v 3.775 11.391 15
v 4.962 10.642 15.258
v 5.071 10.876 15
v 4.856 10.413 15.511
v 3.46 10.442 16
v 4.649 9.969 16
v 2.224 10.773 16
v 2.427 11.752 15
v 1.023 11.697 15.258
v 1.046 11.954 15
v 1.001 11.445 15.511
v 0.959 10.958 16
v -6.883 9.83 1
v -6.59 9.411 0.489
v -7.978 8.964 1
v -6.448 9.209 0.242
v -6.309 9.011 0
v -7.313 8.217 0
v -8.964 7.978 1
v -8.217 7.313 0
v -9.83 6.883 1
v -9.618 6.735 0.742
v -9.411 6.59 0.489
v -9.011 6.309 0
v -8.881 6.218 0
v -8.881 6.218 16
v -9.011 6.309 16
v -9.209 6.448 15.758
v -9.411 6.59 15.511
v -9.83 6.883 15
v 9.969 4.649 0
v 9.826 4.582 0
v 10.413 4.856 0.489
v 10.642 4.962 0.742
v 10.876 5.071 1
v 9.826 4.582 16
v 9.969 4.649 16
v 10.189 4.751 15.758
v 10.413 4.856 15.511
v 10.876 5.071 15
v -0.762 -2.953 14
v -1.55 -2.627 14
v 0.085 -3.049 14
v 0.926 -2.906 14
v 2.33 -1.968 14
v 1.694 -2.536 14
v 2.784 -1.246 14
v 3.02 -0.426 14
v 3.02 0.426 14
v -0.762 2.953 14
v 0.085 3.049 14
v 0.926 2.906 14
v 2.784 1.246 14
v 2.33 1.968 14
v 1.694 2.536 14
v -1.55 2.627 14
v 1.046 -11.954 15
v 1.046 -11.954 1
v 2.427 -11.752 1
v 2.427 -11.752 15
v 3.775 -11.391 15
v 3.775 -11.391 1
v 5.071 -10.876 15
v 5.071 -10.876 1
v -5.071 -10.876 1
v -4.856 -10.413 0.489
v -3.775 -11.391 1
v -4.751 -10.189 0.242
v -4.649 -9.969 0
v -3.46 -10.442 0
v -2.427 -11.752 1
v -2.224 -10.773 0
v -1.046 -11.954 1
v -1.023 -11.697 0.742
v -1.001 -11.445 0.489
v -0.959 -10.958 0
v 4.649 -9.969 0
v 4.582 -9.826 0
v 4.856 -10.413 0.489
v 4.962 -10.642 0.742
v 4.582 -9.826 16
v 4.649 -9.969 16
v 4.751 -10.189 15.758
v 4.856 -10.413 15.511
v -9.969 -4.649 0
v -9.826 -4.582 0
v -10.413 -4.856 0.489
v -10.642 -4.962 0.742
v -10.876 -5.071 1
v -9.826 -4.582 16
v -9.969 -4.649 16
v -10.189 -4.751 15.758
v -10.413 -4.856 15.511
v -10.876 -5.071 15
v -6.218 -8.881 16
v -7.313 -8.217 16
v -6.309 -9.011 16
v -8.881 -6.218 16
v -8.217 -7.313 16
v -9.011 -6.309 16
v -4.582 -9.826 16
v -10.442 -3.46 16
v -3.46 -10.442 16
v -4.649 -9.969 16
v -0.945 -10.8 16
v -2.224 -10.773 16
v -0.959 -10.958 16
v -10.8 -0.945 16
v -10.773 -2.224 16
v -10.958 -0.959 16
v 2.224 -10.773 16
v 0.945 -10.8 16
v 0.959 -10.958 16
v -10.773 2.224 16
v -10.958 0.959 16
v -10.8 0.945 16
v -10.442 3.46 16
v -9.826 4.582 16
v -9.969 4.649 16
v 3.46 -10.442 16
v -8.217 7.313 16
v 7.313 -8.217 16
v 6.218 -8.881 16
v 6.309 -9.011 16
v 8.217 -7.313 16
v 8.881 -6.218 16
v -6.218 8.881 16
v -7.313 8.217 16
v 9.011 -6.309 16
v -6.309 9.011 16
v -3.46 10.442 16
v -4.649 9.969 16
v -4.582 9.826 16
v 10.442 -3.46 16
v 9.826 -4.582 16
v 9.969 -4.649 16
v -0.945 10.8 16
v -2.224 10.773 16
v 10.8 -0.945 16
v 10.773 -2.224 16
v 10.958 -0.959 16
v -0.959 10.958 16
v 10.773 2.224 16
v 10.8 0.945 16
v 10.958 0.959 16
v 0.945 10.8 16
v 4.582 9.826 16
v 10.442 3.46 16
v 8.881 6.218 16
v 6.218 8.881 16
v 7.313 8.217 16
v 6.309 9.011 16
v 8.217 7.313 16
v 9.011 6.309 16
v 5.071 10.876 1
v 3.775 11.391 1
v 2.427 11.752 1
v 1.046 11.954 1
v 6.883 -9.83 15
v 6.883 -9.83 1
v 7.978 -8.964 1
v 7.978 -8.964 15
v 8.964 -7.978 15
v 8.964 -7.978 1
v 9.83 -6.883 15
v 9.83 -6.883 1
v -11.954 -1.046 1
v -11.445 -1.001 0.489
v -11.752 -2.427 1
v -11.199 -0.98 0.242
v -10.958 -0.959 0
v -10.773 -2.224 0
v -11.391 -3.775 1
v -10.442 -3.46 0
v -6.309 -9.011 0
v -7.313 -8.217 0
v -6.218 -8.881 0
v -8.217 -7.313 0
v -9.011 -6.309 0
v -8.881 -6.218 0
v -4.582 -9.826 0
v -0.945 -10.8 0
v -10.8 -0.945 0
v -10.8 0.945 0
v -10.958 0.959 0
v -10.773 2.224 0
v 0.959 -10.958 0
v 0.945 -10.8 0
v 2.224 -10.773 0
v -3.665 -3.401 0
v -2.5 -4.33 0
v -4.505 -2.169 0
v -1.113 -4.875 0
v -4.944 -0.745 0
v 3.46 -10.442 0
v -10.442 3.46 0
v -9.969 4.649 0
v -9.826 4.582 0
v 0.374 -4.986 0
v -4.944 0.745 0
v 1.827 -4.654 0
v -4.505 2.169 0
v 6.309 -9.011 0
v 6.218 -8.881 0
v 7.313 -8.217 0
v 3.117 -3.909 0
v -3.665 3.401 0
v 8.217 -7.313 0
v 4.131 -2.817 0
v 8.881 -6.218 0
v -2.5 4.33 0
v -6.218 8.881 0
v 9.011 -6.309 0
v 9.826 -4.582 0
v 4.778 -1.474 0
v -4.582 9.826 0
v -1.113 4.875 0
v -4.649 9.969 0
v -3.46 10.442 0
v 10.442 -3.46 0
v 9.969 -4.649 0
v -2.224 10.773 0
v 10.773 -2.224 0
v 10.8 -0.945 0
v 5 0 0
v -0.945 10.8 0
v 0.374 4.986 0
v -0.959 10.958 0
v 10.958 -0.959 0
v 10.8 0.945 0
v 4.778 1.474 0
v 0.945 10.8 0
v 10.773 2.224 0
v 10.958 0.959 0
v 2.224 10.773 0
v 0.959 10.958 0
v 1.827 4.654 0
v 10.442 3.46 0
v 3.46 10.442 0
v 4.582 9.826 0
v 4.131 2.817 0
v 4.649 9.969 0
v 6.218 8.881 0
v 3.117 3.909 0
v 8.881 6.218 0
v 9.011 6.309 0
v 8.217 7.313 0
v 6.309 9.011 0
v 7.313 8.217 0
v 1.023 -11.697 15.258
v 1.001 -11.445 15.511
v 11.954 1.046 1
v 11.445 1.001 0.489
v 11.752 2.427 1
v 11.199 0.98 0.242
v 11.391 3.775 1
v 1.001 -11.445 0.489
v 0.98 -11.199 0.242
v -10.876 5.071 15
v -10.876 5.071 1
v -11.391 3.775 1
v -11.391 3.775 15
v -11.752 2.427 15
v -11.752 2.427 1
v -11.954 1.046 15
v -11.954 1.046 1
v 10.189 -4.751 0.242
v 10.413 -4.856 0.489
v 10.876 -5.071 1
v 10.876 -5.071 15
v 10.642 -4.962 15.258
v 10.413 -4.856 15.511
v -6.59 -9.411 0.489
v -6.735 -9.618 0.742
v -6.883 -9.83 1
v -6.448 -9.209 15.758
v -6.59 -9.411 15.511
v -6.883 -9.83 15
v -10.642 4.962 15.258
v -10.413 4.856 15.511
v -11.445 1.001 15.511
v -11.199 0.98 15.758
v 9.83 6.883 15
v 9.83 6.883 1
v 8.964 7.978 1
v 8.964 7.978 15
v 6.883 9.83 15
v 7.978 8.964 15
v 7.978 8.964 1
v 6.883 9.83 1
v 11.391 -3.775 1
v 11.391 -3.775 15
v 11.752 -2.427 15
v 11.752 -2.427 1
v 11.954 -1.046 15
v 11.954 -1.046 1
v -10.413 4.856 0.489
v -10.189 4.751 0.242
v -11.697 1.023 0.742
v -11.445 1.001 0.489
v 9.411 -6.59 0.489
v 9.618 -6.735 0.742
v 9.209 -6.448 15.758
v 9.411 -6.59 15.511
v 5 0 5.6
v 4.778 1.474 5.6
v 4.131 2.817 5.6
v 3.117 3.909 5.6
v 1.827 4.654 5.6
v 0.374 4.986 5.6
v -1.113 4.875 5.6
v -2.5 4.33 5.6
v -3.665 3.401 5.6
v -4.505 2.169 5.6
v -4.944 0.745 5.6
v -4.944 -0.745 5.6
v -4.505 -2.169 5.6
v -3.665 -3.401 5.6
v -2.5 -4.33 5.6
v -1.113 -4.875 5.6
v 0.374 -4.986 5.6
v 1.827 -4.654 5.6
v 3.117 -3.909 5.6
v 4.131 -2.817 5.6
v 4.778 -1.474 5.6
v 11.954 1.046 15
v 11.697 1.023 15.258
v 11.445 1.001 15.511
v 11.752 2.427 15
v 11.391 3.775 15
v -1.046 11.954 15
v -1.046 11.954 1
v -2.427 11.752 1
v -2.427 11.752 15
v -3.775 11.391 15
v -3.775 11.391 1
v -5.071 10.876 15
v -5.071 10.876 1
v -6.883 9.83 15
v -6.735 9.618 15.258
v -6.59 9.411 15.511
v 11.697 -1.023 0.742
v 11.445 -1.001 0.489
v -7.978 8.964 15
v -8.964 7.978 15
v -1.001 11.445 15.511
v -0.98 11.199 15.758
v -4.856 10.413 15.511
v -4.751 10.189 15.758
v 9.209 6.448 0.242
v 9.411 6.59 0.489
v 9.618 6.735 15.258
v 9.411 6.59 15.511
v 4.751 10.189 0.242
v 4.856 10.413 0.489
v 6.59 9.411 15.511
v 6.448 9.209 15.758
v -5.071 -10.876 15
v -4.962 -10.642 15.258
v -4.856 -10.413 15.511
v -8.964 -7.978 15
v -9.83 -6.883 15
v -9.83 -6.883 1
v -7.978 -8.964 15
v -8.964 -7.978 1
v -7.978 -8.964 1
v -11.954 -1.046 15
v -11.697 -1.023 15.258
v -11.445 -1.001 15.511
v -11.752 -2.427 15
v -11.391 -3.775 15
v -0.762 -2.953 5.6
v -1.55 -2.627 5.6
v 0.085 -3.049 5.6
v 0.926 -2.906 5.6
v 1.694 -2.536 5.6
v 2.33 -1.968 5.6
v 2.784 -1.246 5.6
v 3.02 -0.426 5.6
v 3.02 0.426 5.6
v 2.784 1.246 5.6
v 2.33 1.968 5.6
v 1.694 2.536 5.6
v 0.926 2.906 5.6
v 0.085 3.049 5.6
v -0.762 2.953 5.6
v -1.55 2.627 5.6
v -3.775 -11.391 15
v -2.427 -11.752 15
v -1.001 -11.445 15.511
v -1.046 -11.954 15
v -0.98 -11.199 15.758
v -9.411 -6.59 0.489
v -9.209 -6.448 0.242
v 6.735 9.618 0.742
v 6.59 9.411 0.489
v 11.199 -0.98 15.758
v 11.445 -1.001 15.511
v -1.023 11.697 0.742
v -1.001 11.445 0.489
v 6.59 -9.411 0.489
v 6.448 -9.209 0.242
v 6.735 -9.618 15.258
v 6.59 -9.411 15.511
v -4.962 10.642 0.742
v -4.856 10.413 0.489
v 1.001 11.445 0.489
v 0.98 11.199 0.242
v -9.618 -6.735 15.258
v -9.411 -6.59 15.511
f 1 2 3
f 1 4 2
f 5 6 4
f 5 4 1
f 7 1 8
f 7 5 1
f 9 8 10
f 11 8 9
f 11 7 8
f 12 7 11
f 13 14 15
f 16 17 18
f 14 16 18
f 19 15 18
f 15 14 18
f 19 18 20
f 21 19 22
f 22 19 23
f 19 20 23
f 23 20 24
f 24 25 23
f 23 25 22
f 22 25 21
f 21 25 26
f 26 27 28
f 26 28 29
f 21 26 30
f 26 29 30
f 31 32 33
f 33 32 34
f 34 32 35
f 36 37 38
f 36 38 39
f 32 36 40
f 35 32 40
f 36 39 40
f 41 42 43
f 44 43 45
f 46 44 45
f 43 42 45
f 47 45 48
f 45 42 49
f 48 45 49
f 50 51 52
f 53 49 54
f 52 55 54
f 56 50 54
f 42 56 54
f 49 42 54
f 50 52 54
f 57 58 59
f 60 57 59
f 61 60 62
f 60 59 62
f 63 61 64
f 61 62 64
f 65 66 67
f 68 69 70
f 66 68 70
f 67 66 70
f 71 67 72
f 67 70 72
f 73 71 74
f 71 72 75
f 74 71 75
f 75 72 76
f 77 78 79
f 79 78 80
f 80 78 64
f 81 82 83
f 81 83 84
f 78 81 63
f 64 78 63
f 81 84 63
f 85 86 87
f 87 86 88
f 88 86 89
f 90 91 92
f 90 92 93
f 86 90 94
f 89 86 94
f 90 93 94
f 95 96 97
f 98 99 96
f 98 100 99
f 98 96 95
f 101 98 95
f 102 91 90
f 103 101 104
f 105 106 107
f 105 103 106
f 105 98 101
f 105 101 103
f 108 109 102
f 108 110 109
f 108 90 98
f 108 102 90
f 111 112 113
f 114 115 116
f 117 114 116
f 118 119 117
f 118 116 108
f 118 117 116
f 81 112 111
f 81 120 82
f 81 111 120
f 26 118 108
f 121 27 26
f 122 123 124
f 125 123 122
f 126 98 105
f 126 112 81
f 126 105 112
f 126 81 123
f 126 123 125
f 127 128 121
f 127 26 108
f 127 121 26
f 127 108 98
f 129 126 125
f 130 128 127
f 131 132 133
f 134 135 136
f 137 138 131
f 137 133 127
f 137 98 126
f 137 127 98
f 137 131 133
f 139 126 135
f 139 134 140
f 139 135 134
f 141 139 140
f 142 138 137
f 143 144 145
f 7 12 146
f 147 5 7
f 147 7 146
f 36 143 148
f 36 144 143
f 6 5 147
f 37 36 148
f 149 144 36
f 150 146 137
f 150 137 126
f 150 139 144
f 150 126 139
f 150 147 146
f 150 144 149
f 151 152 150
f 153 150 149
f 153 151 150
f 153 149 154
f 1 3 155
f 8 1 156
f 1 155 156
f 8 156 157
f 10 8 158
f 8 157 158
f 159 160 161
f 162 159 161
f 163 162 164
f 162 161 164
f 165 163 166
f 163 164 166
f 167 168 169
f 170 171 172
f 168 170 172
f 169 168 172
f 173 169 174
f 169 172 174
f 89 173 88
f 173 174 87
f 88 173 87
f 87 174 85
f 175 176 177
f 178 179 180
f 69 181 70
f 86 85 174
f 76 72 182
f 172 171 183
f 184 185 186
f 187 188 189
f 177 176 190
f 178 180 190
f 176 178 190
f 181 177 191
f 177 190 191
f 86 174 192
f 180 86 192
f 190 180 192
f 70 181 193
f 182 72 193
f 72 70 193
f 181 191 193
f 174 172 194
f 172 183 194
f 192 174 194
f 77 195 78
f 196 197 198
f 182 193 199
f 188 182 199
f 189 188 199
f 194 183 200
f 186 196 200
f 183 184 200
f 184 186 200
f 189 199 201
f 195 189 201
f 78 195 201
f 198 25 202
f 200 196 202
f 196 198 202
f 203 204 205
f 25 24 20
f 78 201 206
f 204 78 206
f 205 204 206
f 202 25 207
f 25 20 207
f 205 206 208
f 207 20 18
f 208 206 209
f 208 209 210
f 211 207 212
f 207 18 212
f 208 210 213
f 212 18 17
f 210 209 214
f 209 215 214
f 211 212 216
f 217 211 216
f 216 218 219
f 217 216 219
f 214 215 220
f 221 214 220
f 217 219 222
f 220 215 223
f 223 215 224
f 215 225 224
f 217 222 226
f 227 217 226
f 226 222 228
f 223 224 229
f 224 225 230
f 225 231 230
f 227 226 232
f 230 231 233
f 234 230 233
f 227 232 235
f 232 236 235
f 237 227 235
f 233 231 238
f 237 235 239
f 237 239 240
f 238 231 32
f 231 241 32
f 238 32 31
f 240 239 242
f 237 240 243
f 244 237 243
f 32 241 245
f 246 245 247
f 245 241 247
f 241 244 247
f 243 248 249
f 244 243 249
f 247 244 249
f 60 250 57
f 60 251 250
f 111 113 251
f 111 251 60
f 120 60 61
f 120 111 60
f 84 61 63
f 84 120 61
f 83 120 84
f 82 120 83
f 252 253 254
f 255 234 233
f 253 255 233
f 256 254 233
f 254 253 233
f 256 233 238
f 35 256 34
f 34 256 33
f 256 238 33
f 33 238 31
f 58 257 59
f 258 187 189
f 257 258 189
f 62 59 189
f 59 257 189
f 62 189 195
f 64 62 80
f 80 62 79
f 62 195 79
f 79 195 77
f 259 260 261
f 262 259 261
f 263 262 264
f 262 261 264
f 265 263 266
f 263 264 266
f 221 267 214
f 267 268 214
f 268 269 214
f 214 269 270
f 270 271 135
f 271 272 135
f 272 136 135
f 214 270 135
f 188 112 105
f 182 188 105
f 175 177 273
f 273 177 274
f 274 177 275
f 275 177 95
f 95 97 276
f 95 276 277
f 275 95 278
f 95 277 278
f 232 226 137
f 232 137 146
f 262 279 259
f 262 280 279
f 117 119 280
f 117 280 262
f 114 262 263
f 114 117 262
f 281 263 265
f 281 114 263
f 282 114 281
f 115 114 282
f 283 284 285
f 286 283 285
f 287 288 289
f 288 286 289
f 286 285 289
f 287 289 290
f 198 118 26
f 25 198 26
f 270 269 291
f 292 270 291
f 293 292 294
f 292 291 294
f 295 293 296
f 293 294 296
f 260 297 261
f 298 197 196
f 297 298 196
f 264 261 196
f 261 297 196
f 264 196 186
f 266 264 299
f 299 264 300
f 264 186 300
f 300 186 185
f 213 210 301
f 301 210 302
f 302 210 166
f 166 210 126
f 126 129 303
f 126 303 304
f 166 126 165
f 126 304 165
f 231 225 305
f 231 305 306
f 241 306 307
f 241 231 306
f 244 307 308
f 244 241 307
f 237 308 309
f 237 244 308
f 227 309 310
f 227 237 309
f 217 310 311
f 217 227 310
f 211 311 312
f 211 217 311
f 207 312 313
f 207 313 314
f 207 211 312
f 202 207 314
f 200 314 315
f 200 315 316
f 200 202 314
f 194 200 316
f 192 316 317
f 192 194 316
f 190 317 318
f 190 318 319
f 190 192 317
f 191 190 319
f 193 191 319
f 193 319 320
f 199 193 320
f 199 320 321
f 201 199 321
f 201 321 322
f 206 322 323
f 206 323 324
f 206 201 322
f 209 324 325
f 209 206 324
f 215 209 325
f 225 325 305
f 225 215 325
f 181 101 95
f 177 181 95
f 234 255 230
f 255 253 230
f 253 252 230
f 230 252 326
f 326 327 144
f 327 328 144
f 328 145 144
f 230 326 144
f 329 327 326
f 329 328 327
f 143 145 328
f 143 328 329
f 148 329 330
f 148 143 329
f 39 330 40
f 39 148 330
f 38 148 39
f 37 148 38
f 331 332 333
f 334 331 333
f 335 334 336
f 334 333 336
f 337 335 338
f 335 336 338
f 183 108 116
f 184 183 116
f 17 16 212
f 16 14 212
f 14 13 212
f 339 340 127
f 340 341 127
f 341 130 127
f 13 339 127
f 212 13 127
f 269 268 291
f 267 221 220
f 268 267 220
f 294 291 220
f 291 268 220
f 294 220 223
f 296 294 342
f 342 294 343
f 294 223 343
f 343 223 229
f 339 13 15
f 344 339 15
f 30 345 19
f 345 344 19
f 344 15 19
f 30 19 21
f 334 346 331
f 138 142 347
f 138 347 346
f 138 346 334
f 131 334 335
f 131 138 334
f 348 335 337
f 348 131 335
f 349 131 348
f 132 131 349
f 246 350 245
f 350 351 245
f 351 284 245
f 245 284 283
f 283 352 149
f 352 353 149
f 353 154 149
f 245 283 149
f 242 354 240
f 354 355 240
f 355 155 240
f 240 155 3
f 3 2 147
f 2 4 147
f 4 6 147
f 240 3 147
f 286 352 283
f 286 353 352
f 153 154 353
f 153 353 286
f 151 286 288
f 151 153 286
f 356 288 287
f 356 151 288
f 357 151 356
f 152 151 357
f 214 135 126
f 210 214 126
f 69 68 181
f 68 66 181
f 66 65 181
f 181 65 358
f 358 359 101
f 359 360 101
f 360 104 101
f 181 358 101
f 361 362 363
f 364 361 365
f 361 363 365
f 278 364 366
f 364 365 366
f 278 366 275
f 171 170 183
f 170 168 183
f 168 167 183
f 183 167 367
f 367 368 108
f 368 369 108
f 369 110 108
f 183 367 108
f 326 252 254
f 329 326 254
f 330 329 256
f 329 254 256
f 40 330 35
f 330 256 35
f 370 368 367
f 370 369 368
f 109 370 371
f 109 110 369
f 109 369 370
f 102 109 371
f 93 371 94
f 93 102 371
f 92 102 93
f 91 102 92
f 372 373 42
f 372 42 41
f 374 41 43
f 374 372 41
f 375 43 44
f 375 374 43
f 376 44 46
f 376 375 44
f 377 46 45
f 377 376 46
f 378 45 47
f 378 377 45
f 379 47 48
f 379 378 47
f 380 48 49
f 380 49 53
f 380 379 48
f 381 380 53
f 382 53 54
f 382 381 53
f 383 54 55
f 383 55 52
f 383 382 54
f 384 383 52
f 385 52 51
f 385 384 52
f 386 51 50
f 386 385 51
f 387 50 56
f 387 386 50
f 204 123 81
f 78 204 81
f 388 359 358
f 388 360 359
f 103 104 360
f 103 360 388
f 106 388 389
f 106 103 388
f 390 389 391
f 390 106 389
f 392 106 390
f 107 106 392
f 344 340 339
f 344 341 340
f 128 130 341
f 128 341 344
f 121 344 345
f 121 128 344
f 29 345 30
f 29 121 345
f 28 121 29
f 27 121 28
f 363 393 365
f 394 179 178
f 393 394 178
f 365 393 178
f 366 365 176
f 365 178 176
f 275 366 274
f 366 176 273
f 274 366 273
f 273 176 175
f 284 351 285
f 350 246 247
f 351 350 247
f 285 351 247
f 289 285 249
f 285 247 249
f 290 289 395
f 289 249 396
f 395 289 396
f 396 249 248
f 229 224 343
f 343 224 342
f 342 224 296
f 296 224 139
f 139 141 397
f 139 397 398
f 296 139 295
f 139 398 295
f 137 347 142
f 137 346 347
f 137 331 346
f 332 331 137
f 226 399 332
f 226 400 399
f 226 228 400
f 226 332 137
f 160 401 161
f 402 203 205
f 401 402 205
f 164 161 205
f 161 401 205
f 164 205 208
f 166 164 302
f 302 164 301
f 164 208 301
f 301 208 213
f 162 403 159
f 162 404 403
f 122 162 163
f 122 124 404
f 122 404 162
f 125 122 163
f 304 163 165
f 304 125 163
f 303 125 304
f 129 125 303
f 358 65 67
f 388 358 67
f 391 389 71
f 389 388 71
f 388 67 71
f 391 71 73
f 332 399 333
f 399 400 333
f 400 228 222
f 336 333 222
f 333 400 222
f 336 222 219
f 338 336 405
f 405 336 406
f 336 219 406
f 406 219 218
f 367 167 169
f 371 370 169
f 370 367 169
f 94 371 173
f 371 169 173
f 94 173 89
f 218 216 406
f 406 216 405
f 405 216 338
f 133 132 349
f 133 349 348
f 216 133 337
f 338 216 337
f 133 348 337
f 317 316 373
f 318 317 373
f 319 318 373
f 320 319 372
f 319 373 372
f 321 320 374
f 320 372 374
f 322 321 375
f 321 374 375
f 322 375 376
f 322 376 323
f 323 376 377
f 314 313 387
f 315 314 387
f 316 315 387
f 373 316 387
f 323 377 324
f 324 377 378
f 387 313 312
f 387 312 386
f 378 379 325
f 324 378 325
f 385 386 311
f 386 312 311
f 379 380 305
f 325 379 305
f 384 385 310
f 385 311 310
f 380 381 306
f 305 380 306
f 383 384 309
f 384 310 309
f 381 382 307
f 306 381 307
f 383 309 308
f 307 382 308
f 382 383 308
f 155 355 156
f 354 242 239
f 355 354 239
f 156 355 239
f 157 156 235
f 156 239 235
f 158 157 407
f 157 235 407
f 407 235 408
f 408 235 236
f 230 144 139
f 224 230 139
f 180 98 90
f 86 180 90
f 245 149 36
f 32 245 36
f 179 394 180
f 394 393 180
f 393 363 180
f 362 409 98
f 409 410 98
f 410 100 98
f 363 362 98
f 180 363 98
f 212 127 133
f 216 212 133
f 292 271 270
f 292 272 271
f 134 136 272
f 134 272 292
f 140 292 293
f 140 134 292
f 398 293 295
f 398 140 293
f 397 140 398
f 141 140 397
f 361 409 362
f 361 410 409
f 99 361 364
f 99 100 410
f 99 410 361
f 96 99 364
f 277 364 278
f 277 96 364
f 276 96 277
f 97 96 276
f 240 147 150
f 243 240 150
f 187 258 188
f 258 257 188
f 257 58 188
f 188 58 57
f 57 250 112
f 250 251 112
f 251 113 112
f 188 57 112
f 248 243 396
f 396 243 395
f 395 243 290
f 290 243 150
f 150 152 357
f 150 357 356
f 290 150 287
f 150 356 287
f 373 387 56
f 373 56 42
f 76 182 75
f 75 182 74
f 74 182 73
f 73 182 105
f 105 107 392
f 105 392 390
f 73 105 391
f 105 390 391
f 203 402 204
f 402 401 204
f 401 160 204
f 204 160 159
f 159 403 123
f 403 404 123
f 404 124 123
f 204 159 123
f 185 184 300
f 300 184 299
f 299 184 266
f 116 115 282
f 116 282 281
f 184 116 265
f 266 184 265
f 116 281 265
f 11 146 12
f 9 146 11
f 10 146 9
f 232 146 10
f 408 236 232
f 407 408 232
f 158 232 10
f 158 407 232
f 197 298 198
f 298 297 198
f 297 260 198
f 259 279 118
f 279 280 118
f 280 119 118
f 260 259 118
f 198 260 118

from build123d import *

# Parameters (mm, degrees)
SKETCH002_R        = 12
PAD002_DEPTH       = 16
CHAMFER_SIZE       = 1
POCKET_DEPTH       = 75.047652
POCKET_DEPTH_BACK  = 91.047652
POLARPATTERN_COUNT = 12
SKETCH_R           = 5
POCKET001_DEPTH    = 5.6
POCKET002_DEPTH    = 14


with BuildPart() as part:
    # Sketch002 → Pad002 (new body)
    with BuildSketch(Plane.XY):
        Circle(SKETCH002_R)
    extrude(amount=PAD002_DEPTH)

    # Chamfer
    chamfer_edges = [part.edges().sort_by_distance(p)[0] for p in [
        (-12, 0, 16),
        (-12, 0, 0),
    ]]
    chamfer(chamfer_edges, length=CHAMFER_SIZE)

    # Sketch003 → Pocket (cut, two sides)
    with BuildSketch(Plane.XY) as pocket_sk:
        Polygon((-1.058613, 12.1), (-0.944878, 10.8), (0.944878, 10.8), (1.058613, 12.1), align=None)
    pocket = extrude(amount=-POCKET_DEPTH, mode=Mode.SUBTRACT) + extrude(pocket_sk.sketch, amount=POCKET_DEPTH_BACK, mode=Mode.SUBTRACT)

    # PolarPattern: Pocket ×12 about axis
    polarpattern_axis = Axis((0, 0, 0), (0, 0, 1))
    for i in range(1, POLARPATTERN_COUNT):
        add(pocket.rotate(polarpattern_axis, i * 360 / POLARPATTERN_COUNT), mode=Mode.SUBTRACT)

    # Sketch → Pocket001 (cut)
    with BuildSketch(Plane.XY):
        Circle(SKETCH_R)
    extrude(amount=POCKET001_DEPTH, mode=Mode.SUBTRACT)

    # Sketch004 → Pocket002 (cut)
    with BuildSketch(Plane.XY):
        with BuildLine():
            ThreePointArc((-1.55, -2.626785), (3.05, 0), (-1.55, 2.626785))
            Line((-1.55, 2.626785), (-1.55, -2.626785))
        make_face()
    extrude(amount=POCKET002_DEPTH, mode=Mode.SUBTRACT)


solid = part.part
